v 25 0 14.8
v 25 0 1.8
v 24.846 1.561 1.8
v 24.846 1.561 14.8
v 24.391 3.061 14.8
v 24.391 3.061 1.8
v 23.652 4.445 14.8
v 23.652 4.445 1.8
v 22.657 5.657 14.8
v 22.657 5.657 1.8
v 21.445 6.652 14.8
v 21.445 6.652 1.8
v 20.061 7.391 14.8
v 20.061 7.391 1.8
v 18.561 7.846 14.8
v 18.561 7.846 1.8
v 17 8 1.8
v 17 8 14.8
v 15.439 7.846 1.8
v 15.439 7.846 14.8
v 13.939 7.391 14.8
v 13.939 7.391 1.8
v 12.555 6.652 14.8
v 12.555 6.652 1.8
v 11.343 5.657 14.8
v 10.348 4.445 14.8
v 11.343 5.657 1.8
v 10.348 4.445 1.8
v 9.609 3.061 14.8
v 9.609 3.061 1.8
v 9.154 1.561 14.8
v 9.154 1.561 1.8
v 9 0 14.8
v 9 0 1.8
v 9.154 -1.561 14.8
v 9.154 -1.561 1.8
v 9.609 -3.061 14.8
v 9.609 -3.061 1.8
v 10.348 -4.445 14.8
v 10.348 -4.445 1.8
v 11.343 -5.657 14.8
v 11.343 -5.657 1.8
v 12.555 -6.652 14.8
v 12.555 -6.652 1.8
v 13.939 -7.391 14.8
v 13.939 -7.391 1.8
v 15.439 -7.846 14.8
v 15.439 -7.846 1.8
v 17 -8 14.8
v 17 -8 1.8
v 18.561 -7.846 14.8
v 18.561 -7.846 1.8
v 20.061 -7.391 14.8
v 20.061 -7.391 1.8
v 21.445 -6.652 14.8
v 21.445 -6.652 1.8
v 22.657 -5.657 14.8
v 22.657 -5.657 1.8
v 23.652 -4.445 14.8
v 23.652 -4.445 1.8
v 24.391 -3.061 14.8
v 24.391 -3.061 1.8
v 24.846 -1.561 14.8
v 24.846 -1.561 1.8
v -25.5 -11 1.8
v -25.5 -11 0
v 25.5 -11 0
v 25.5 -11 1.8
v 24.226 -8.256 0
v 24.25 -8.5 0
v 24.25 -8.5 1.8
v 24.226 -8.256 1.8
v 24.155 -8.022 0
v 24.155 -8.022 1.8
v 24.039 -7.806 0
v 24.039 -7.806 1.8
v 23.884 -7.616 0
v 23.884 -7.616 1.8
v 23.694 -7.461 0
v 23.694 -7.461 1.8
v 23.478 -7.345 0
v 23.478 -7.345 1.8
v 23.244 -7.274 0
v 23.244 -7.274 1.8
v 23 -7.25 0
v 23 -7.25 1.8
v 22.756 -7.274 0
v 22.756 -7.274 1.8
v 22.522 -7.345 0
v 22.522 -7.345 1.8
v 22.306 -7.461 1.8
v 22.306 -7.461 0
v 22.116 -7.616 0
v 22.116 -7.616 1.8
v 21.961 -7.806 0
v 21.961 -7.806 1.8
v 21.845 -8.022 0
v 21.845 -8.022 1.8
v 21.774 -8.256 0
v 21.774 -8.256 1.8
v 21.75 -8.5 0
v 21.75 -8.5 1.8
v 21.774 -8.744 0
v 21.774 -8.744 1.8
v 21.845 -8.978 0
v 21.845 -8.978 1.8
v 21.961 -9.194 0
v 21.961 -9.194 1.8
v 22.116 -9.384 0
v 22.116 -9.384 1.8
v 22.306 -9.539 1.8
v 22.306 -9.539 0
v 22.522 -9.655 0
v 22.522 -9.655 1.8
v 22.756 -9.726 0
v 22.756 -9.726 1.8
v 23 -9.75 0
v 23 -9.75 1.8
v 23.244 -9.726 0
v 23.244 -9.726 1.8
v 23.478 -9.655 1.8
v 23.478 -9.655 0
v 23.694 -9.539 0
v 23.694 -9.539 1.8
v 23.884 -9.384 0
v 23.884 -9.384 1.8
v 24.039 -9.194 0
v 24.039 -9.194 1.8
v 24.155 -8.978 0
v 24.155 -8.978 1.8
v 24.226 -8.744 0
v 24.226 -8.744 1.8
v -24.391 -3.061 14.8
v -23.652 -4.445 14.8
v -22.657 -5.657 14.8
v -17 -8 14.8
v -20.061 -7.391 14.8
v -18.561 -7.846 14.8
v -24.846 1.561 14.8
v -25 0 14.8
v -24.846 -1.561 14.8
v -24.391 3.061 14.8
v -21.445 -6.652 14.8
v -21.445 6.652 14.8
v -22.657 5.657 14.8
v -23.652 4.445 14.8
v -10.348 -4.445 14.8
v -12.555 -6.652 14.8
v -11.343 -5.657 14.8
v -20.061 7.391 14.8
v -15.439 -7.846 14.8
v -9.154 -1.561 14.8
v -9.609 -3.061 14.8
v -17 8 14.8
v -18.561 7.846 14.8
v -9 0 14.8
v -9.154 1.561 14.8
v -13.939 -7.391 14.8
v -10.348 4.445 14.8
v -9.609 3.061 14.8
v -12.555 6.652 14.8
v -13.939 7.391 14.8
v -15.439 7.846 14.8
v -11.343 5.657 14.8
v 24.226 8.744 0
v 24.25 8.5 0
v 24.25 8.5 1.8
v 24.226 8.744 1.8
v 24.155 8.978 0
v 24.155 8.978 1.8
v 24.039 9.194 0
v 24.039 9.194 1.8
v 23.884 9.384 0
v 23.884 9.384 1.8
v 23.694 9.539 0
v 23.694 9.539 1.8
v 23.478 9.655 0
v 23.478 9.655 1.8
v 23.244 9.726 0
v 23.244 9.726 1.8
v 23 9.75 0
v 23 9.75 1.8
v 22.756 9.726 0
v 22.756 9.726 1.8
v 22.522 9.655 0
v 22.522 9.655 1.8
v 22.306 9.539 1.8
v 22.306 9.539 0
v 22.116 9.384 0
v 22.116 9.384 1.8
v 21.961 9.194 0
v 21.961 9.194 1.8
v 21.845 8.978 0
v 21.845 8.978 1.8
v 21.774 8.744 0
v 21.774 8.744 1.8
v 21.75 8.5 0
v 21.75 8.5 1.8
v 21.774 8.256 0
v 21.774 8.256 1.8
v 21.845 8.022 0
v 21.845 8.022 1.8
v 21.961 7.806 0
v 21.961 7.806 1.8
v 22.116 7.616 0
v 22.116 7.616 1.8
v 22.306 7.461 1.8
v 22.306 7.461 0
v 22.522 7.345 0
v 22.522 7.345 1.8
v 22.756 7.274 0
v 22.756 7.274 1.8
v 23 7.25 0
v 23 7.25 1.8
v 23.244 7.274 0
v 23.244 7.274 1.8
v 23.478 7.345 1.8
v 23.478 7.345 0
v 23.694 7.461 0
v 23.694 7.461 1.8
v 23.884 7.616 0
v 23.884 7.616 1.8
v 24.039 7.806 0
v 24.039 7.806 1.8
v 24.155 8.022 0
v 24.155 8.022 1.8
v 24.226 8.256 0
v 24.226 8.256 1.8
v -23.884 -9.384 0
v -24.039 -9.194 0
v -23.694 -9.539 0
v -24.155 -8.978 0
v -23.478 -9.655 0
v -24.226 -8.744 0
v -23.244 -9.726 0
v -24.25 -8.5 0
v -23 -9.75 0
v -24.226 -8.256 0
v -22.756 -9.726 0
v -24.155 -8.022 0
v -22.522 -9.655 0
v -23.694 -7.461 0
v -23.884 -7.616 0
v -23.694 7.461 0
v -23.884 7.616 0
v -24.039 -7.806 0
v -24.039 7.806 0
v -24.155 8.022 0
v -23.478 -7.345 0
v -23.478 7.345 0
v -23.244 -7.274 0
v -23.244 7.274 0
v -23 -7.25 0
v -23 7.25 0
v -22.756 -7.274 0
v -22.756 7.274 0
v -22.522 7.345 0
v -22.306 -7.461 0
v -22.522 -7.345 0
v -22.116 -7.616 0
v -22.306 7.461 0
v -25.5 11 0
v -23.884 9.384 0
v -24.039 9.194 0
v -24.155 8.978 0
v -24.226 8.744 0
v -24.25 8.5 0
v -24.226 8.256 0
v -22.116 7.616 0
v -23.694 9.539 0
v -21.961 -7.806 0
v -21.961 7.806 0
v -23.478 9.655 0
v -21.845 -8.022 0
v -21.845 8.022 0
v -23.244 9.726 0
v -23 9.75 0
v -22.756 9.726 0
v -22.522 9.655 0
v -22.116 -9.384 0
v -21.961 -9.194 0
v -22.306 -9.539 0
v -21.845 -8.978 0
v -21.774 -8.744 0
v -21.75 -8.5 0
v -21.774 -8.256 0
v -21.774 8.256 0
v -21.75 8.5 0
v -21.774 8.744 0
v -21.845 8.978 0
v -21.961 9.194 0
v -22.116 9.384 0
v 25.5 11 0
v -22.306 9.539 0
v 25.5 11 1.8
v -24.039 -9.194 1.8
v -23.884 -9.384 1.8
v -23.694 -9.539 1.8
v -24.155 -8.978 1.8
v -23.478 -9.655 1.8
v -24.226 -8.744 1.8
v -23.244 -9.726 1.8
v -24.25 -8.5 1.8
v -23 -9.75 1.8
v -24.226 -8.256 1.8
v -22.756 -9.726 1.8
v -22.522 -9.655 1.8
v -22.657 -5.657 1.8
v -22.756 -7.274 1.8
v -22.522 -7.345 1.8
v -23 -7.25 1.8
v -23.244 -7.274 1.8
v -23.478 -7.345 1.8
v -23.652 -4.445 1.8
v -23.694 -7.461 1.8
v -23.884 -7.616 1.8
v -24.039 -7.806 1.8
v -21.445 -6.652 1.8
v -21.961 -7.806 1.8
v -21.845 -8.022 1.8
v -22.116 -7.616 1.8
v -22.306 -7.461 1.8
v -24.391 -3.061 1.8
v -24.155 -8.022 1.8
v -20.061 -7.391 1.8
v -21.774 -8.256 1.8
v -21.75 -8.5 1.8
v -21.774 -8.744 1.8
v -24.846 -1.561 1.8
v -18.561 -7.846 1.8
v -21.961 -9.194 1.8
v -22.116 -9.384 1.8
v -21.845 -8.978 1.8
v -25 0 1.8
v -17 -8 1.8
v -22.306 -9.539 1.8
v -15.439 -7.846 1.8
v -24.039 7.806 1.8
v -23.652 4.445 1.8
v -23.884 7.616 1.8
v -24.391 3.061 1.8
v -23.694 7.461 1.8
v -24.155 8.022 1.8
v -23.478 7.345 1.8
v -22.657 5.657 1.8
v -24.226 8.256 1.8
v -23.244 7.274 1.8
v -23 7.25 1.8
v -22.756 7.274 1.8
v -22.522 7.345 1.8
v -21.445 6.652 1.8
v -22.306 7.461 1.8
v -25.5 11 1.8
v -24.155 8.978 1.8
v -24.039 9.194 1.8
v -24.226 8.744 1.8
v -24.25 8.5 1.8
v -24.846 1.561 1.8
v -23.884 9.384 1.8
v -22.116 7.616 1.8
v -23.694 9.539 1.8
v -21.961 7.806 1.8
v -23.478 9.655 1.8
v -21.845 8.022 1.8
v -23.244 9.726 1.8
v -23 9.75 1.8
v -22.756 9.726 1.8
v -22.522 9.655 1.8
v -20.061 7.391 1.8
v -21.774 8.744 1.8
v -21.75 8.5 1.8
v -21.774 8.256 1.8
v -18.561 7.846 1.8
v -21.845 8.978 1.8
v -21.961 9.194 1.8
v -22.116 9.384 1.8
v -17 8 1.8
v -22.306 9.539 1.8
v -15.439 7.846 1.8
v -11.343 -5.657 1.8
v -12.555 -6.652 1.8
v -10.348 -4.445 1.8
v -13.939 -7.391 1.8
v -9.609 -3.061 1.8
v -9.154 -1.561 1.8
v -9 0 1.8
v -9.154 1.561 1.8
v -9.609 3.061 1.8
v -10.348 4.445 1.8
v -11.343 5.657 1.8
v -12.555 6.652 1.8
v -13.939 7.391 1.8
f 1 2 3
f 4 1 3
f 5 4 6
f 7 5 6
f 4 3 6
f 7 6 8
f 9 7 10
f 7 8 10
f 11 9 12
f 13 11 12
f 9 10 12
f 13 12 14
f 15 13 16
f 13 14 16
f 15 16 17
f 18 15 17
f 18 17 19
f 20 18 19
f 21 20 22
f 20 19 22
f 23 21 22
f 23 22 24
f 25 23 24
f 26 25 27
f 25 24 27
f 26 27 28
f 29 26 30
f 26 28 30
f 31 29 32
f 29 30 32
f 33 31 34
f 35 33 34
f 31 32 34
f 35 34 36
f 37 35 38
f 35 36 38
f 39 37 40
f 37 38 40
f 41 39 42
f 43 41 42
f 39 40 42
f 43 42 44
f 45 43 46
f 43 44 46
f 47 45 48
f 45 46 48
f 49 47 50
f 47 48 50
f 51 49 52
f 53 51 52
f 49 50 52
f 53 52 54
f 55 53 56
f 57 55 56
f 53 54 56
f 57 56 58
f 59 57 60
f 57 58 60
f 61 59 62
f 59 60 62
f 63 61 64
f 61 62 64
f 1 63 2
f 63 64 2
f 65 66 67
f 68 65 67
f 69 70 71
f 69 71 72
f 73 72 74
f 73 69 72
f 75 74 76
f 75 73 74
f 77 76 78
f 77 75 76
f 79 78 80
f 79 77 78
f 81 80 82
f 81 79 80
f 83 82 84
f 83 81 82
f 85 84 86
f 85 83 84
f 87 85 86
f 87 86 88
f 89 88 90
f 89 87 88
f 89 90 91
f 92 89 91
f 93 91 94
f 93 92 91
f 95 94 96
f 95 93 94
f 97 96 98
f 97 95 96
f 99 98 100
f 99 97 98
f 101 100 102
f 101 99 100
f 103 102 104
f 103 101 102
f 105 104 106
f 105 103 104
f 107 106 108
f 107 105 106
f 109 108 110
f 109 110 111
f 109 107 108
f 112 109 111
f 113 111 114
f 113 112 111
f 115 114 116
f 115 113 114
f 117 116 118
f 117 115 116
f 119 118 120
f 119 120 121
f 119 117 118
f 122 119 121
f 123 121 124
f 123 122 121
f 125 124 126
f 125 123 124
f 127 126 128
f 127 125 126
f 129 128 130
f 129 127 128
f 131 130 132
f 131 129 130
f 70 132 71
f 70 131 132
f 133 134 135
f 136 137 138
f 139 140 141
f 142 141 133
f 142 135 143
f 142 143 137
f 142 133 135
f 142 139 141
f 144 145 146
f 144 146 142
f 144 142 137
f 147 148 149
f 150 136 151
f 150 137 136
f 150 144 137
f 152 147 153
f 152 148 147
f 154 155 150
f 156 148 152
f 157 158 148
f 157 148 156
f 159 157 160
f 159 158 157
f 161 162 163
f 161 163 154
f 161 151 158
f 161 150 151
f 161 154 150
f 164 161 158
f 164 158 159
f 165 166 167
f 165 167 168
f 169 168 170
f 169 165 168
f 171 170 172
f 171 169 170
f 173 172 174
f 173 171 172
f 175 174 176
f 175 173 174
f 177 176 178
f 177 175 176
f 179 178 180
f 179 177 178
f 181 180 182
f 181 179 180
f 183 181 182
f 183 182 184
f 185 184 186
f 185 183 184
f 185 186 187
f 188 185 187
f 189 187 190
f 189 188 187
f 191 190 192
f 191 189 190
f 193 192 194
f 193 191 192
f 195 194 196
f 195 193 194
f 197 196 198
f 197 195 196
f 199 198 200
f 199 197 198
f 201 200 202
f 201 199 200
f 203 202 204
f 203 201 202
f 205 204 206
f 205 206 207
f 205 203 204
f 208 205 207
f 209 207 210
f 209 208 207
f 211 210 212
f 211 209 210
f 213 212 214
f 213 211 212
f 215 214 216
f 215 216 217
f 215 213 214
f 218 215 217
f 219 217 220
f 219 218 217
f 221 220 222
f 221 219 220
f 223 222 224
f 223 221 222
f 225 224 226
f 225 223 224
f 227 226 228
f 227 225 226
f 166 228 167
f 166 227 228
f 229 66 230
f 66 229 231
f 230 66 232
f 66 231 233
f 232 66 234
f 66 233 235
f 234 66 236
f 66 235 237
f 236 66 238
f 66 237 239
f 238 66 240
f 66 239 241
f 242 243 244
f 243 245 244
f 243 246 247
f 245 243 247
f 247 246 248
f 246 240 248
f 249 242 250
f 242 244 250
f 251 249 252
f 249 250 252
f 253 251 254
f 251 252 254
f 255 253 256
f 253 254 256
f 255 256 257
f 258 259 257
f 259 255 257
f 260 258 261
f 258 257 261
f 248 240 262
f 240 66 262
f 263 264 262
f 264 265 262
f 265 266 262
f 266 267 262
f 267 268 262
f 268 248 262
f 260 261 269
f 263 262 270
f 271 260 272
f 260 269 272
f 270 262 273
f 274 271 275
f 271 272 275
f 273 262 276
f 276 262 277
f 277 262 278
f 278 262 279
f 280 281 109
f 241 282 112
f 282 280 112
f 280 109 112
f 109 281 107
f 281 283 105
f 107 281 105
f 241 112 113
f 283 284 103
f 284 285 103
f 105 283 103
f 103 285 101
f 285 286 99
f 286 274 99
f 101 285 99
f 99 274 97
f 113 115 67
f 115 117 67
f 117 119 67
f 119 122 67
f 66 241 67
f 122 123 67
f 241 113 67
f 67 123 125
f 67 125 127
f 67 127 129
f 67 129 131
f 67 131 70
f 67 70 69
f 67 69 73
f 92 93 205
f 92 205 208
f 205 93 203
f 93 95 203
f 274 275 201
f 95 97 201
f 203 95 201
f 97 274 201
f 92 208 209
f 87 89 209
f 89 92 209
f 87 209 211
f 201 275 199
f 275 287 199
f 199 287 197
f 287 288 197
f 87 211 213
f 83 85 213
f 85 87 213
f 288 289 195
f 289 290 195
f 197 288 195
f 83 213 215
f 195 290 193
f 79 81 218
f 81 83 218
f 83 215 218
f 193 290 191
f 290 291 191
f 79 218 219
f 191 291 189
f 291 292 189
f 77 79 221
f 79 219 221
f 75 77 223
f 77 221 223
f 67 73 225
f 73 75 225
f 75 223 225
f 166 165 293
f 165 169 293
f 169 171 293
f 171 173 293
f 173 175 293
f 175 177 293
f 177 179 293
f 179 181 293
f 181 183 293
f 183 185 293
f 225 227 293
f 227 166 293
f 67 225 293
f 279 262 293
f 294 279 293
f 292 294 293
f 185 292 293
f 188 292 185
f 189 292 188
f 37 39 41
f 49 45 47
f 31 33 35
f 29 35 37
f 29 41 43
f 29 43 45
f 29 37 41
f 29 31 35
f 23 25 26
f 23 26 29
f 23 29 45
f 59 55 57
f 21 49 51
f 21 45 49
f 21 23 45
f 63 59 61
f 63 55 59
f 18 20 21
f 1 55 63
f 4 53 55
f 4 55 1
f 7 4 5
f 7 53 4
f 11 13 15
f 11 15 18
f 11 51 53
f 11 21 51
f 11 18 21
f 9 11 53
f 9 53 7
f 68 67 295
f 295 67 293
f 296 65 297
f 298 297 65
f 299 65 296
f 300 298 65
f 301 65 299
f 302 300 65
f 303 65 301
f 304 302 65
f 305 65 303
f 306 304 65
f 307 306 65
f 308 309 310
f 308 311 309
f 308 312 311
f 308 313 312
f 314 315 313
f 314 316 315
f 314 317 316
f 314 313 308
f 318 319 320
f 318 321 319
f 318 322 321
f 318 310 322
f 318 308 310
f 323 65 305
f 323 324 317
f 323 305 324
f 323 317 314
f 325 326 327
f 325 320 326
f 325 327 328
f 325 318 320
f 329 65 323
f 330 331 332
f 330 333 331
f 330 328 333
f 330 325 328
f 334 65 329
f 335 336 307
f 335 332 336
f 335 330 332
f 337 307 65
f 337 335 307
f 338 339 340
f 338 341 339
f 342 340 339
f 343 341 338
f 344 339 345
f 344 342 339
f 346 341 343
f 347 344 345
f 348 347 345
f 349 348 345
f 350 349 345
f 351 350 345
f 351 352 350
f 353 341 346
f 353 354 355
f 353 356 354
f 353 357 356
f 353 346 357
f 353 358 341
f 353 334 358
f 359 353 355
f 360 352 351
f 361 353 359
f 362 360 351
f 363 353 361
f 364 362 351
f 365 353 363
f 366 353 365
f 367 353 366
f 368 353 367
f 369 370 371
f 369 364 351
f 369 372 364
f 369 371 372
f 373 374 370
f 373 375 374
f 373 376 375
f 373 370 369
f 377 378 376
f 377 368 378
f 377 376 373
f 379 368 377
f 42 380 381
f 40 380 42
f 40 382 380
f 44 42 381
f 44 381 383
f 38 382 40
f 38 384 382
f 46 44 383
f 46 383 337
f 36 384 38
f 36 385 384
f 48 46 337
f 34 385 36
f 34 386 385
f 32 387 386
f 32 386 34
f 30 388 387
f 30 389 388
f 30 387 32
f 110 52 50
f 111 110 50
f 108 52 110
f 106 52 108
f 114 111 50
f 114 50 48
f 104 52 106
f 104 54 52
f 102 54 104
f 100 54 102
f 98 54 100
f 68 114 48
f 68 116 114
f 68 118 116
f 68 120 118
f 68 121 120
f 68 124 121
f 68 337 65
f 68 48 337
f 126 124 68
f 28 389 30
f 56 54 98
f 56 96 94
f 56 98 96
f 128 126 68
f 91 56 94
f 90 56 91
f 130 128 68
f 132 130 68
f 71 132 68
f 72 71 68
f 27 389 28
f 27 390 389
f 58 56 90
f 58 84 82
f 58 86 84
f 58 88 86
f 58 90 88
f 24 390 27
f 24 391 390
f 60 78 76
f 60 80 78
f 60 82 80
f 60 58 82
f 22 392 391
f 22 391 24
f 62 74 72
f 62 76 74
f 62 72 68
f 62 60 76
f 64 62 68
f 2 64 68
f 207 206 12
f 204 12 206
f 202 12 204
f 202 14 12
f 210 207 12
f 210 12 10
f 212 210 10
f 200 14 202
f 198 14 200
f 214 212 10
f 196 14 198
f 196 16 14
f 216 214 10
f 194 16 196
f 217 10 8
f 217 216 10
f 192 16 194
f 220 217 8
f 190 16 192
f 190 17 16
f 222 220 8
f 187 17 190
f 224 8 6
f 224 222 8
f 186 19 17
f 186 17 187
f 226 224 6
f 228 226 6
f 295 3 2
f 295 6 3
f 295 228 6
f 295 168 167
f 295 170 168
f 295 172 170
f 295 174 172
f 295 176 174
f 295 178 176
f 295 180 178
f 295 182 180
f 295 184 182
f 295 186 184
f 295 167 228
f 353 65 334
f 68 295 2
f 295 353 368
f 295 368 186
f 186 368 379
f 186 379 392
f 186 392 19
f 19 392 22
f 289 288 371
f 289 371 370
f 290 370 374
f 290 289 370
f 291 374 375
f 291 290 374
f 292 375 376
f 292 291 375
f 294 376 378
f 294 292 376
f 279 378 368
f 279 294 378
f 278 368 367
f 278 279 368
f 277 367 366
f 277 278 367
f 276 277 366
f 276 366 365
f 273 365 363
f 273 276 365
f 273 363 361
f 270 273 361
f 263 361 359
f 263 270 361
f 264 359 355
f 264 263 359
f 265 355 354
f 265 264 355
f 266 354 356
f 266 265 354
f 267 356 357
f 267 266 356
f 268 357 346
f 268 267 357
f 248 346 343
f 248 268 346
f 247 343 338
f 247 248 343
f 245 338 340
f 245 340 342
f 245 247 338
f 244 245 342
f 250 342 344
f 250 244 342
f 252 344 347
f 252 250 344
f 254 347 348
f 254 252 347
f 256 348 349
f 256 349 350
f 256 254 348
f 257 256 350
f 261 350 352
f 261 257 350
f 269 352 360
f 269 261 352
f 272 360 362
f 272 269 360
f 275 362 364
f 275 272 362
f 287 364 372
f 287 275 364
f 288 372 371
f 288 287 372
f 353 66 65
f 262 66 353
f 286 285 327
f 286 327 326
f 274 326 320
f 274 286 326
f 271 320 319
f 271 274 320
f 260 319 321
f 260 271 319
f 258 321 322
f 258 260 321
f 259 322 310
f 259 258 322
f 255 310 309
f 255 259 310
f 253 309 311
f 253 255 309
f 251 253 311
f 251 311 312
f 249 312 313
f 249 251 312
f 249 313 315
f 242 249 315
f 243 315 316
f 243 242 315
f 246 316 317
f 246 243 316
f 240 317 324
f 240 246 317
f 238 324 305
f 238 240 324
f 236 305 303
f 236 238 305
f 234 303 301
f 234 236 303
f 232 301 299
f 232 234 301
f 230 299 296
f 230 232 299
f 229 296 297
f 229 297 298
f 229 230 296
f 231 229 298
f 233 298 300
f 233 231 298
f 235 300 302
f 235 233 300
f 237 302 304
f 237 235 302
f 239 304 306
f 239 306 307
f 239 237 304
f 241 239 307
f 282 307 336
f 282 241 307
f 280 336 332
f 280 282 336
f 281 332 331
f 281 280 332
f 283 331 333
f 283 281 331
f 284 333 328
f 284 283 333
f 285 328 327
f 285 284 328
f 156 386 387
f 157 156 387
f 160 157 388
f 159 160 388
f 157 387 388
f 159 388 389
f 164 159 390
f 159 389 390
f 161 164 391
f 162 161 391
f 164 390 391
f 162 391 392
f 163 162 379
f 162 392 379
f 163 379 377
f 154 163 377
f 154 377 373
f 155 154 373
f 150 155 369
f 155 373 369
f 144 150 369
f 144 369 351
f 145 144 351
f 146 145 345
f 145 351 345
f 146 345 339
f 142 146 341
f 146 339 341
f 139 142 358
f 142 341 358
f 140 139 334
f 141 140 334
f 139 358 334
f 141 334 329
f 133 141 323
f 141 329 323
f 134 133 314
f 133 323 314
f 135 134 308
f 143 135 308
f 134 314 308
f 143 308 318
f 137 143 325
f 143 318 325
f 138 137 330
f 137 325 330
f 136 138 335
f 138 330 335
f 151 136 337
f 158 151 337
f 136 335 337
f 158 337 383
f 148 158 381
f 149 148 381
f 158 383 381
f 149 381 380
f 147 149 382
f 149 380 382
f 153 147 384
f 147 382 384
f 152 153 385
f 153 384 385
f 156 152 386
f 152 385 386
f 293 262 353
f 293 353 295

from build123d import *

# Parameters (mm, degrees)
SKETCH1_W           = 51
SKETCH1_H           = 22
SKETCH1_R           = 1.25
BOSS_EXTRUDE1_DEPTH = 1.8
SKETCH2_R           = 8
BOSS_EXTRUDE2_DEPTH = 13


with BuildPart() as part:
    # Sketch1 → Boss-Extrude1 (new body)
    with BuildSketch(Plane.XY):
        Rectangle(SKETCH1_W, SKETCH1_H)
        with Locations((-23, -8.5)):
            Circle(SKETCH1_R, mode=Mode.SUBTRACT)
        with Locations((-23, 8.5)):
            Circle(SKETCH1_R, mode=Mode.SUBTRACT)
        with Locations((23, 8.5)):
            Circle(SKETCH1_R, mode=Mode.SUBTRACT)
        with Locations((23, -8.5)):
            Circle(SKETCH1_R, mode=Mode.SUBTRACT)
    extrude(amount=BOSS_EXTRUDE1_DEPTH)

    # Sketch2 → Boss-Extrude2 (add)
    with BuildSketch(Plane.XY.offset(1.8)):
        with Locations((-17, 0)):
            Circle(SKETCH2_R)
        with Locations((17, 0)):
            Circle(SKETCH2_R)
    extrude(amount=BOSS_EXTRUDE2_DEPTH)


solid = part.part
